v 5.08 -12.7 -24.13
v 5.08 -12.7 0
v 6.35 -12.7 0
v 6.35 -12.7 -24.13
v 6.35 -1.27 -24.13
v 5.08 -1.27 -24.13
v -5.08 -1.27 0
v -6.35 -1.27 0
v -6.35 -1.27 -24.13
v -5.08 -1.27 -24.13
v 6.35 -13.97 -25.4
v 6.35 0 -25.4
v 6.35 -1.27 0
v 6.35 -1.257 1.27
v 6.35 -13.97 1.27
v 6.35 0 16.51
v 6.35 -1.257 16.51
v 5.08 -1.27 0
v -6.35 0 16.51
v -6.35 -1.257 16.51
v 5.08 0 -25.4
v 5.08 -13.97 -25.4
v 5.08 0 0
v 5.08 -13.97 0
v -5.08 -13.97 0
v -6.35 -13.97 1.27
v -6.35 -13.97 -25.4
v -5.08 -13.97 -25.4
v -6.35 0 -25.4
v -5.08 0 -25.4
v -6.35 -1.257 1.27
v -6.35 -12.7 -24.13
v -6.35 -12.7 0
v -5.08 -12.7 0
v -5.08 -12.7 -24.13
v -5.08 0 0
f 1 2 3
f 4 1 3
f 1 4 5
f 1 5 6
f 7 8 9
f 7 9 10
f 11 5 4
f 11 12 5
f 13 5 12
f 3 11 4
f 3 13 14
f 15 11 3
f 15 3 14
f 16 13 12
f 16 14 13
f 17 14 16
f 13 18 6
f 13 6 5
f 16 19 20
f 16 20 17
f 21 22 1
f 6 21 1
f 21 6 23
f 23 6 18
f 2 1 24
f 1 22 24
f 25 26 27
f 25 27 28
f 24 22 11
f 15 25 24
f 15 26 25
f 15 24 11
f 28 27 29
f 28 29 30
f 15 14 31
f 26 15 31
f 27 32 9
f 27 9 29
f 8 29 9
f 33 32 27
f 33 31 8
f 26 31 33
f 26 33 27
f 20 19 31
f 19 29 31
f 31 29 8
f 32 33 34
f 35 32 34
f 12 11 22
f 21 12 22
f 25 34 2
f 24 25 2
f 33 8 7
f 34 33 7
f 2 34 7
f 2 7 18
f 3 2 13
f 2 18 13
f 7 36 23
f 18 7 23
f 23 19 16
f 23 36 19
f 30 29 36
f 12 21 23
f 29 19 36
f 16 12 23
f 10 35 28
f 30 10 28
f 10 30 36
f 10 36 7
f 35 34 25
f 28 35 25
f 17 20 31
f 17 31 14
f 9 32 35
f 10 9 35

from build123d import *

# Parameters (mm, degrees)
F1_DEPTH = 13.97
F2_W     = 12.7
F2_H     = 1.257444
F3_DEPTH = 15.24
F4_W     = 1.27
F4_H     = 1.27
F5_DEPTH = 25.4
F6_W     = 1.27
F6_H     = 1.27
F7_DEPTH = 12.7


with BuildPart() as f1:
    # F0 (on Front) → F1 (new body)
    with BuildSketch(Plane.XZ):
        Polygon((-6.35, 0), (0, 0), (6.35, 0), (6.35, 1.27), (0, 1.27), (-6.35, 1.27), align=None)
    extrude(amount=F1_DEPTH)

    # F2 (on face) → F3 (join)
    with BuildSketch(Plane.XY.offset(1.27)):
        with Locations((0, -0.628722)):
            Rectangle(F2_W, F2_H)
    extrude(amount=F3_DEPTH)

    # F4 (on face) → F5 (join)
    with BuildSketch(Plane(origin=(0, 0, 0), x_dir=(1, 0, 0), z_dir=(0, 0, -1))):
        with Locations((-5.715, 13.335)):
            Rectangle(F4_W, F4_H)
        with Locations((-5.715, 0.635)):
            Rectangle(F4_W, F4_H)
        with Locations((5.715, 0.635)):
            Rectangle(F4_W, F4_H)
        with Locations((5.715, 13.335)):
            Rectangle(F4_W, F4_H)
    extrude(amount=F5_DEPTH)

    # F6 (on face) → F7 (join)
    with BuildSketch(Plane(origin=(0, -12.7, 0), x_dir=(-1, 0, 0), z_dir=(0, 1, 0))):
        with Locations((-5.715, -24.765)):
            Rectangle(F6_W, F6_H)
    extrude(amount=F7_DEPTH)

    # F8: F1 across plane


with BuildPart() as f1_1:
    add(f1.part)
    add(f1.part.mirror(Plane.YZ))


solid = f1_1.part
